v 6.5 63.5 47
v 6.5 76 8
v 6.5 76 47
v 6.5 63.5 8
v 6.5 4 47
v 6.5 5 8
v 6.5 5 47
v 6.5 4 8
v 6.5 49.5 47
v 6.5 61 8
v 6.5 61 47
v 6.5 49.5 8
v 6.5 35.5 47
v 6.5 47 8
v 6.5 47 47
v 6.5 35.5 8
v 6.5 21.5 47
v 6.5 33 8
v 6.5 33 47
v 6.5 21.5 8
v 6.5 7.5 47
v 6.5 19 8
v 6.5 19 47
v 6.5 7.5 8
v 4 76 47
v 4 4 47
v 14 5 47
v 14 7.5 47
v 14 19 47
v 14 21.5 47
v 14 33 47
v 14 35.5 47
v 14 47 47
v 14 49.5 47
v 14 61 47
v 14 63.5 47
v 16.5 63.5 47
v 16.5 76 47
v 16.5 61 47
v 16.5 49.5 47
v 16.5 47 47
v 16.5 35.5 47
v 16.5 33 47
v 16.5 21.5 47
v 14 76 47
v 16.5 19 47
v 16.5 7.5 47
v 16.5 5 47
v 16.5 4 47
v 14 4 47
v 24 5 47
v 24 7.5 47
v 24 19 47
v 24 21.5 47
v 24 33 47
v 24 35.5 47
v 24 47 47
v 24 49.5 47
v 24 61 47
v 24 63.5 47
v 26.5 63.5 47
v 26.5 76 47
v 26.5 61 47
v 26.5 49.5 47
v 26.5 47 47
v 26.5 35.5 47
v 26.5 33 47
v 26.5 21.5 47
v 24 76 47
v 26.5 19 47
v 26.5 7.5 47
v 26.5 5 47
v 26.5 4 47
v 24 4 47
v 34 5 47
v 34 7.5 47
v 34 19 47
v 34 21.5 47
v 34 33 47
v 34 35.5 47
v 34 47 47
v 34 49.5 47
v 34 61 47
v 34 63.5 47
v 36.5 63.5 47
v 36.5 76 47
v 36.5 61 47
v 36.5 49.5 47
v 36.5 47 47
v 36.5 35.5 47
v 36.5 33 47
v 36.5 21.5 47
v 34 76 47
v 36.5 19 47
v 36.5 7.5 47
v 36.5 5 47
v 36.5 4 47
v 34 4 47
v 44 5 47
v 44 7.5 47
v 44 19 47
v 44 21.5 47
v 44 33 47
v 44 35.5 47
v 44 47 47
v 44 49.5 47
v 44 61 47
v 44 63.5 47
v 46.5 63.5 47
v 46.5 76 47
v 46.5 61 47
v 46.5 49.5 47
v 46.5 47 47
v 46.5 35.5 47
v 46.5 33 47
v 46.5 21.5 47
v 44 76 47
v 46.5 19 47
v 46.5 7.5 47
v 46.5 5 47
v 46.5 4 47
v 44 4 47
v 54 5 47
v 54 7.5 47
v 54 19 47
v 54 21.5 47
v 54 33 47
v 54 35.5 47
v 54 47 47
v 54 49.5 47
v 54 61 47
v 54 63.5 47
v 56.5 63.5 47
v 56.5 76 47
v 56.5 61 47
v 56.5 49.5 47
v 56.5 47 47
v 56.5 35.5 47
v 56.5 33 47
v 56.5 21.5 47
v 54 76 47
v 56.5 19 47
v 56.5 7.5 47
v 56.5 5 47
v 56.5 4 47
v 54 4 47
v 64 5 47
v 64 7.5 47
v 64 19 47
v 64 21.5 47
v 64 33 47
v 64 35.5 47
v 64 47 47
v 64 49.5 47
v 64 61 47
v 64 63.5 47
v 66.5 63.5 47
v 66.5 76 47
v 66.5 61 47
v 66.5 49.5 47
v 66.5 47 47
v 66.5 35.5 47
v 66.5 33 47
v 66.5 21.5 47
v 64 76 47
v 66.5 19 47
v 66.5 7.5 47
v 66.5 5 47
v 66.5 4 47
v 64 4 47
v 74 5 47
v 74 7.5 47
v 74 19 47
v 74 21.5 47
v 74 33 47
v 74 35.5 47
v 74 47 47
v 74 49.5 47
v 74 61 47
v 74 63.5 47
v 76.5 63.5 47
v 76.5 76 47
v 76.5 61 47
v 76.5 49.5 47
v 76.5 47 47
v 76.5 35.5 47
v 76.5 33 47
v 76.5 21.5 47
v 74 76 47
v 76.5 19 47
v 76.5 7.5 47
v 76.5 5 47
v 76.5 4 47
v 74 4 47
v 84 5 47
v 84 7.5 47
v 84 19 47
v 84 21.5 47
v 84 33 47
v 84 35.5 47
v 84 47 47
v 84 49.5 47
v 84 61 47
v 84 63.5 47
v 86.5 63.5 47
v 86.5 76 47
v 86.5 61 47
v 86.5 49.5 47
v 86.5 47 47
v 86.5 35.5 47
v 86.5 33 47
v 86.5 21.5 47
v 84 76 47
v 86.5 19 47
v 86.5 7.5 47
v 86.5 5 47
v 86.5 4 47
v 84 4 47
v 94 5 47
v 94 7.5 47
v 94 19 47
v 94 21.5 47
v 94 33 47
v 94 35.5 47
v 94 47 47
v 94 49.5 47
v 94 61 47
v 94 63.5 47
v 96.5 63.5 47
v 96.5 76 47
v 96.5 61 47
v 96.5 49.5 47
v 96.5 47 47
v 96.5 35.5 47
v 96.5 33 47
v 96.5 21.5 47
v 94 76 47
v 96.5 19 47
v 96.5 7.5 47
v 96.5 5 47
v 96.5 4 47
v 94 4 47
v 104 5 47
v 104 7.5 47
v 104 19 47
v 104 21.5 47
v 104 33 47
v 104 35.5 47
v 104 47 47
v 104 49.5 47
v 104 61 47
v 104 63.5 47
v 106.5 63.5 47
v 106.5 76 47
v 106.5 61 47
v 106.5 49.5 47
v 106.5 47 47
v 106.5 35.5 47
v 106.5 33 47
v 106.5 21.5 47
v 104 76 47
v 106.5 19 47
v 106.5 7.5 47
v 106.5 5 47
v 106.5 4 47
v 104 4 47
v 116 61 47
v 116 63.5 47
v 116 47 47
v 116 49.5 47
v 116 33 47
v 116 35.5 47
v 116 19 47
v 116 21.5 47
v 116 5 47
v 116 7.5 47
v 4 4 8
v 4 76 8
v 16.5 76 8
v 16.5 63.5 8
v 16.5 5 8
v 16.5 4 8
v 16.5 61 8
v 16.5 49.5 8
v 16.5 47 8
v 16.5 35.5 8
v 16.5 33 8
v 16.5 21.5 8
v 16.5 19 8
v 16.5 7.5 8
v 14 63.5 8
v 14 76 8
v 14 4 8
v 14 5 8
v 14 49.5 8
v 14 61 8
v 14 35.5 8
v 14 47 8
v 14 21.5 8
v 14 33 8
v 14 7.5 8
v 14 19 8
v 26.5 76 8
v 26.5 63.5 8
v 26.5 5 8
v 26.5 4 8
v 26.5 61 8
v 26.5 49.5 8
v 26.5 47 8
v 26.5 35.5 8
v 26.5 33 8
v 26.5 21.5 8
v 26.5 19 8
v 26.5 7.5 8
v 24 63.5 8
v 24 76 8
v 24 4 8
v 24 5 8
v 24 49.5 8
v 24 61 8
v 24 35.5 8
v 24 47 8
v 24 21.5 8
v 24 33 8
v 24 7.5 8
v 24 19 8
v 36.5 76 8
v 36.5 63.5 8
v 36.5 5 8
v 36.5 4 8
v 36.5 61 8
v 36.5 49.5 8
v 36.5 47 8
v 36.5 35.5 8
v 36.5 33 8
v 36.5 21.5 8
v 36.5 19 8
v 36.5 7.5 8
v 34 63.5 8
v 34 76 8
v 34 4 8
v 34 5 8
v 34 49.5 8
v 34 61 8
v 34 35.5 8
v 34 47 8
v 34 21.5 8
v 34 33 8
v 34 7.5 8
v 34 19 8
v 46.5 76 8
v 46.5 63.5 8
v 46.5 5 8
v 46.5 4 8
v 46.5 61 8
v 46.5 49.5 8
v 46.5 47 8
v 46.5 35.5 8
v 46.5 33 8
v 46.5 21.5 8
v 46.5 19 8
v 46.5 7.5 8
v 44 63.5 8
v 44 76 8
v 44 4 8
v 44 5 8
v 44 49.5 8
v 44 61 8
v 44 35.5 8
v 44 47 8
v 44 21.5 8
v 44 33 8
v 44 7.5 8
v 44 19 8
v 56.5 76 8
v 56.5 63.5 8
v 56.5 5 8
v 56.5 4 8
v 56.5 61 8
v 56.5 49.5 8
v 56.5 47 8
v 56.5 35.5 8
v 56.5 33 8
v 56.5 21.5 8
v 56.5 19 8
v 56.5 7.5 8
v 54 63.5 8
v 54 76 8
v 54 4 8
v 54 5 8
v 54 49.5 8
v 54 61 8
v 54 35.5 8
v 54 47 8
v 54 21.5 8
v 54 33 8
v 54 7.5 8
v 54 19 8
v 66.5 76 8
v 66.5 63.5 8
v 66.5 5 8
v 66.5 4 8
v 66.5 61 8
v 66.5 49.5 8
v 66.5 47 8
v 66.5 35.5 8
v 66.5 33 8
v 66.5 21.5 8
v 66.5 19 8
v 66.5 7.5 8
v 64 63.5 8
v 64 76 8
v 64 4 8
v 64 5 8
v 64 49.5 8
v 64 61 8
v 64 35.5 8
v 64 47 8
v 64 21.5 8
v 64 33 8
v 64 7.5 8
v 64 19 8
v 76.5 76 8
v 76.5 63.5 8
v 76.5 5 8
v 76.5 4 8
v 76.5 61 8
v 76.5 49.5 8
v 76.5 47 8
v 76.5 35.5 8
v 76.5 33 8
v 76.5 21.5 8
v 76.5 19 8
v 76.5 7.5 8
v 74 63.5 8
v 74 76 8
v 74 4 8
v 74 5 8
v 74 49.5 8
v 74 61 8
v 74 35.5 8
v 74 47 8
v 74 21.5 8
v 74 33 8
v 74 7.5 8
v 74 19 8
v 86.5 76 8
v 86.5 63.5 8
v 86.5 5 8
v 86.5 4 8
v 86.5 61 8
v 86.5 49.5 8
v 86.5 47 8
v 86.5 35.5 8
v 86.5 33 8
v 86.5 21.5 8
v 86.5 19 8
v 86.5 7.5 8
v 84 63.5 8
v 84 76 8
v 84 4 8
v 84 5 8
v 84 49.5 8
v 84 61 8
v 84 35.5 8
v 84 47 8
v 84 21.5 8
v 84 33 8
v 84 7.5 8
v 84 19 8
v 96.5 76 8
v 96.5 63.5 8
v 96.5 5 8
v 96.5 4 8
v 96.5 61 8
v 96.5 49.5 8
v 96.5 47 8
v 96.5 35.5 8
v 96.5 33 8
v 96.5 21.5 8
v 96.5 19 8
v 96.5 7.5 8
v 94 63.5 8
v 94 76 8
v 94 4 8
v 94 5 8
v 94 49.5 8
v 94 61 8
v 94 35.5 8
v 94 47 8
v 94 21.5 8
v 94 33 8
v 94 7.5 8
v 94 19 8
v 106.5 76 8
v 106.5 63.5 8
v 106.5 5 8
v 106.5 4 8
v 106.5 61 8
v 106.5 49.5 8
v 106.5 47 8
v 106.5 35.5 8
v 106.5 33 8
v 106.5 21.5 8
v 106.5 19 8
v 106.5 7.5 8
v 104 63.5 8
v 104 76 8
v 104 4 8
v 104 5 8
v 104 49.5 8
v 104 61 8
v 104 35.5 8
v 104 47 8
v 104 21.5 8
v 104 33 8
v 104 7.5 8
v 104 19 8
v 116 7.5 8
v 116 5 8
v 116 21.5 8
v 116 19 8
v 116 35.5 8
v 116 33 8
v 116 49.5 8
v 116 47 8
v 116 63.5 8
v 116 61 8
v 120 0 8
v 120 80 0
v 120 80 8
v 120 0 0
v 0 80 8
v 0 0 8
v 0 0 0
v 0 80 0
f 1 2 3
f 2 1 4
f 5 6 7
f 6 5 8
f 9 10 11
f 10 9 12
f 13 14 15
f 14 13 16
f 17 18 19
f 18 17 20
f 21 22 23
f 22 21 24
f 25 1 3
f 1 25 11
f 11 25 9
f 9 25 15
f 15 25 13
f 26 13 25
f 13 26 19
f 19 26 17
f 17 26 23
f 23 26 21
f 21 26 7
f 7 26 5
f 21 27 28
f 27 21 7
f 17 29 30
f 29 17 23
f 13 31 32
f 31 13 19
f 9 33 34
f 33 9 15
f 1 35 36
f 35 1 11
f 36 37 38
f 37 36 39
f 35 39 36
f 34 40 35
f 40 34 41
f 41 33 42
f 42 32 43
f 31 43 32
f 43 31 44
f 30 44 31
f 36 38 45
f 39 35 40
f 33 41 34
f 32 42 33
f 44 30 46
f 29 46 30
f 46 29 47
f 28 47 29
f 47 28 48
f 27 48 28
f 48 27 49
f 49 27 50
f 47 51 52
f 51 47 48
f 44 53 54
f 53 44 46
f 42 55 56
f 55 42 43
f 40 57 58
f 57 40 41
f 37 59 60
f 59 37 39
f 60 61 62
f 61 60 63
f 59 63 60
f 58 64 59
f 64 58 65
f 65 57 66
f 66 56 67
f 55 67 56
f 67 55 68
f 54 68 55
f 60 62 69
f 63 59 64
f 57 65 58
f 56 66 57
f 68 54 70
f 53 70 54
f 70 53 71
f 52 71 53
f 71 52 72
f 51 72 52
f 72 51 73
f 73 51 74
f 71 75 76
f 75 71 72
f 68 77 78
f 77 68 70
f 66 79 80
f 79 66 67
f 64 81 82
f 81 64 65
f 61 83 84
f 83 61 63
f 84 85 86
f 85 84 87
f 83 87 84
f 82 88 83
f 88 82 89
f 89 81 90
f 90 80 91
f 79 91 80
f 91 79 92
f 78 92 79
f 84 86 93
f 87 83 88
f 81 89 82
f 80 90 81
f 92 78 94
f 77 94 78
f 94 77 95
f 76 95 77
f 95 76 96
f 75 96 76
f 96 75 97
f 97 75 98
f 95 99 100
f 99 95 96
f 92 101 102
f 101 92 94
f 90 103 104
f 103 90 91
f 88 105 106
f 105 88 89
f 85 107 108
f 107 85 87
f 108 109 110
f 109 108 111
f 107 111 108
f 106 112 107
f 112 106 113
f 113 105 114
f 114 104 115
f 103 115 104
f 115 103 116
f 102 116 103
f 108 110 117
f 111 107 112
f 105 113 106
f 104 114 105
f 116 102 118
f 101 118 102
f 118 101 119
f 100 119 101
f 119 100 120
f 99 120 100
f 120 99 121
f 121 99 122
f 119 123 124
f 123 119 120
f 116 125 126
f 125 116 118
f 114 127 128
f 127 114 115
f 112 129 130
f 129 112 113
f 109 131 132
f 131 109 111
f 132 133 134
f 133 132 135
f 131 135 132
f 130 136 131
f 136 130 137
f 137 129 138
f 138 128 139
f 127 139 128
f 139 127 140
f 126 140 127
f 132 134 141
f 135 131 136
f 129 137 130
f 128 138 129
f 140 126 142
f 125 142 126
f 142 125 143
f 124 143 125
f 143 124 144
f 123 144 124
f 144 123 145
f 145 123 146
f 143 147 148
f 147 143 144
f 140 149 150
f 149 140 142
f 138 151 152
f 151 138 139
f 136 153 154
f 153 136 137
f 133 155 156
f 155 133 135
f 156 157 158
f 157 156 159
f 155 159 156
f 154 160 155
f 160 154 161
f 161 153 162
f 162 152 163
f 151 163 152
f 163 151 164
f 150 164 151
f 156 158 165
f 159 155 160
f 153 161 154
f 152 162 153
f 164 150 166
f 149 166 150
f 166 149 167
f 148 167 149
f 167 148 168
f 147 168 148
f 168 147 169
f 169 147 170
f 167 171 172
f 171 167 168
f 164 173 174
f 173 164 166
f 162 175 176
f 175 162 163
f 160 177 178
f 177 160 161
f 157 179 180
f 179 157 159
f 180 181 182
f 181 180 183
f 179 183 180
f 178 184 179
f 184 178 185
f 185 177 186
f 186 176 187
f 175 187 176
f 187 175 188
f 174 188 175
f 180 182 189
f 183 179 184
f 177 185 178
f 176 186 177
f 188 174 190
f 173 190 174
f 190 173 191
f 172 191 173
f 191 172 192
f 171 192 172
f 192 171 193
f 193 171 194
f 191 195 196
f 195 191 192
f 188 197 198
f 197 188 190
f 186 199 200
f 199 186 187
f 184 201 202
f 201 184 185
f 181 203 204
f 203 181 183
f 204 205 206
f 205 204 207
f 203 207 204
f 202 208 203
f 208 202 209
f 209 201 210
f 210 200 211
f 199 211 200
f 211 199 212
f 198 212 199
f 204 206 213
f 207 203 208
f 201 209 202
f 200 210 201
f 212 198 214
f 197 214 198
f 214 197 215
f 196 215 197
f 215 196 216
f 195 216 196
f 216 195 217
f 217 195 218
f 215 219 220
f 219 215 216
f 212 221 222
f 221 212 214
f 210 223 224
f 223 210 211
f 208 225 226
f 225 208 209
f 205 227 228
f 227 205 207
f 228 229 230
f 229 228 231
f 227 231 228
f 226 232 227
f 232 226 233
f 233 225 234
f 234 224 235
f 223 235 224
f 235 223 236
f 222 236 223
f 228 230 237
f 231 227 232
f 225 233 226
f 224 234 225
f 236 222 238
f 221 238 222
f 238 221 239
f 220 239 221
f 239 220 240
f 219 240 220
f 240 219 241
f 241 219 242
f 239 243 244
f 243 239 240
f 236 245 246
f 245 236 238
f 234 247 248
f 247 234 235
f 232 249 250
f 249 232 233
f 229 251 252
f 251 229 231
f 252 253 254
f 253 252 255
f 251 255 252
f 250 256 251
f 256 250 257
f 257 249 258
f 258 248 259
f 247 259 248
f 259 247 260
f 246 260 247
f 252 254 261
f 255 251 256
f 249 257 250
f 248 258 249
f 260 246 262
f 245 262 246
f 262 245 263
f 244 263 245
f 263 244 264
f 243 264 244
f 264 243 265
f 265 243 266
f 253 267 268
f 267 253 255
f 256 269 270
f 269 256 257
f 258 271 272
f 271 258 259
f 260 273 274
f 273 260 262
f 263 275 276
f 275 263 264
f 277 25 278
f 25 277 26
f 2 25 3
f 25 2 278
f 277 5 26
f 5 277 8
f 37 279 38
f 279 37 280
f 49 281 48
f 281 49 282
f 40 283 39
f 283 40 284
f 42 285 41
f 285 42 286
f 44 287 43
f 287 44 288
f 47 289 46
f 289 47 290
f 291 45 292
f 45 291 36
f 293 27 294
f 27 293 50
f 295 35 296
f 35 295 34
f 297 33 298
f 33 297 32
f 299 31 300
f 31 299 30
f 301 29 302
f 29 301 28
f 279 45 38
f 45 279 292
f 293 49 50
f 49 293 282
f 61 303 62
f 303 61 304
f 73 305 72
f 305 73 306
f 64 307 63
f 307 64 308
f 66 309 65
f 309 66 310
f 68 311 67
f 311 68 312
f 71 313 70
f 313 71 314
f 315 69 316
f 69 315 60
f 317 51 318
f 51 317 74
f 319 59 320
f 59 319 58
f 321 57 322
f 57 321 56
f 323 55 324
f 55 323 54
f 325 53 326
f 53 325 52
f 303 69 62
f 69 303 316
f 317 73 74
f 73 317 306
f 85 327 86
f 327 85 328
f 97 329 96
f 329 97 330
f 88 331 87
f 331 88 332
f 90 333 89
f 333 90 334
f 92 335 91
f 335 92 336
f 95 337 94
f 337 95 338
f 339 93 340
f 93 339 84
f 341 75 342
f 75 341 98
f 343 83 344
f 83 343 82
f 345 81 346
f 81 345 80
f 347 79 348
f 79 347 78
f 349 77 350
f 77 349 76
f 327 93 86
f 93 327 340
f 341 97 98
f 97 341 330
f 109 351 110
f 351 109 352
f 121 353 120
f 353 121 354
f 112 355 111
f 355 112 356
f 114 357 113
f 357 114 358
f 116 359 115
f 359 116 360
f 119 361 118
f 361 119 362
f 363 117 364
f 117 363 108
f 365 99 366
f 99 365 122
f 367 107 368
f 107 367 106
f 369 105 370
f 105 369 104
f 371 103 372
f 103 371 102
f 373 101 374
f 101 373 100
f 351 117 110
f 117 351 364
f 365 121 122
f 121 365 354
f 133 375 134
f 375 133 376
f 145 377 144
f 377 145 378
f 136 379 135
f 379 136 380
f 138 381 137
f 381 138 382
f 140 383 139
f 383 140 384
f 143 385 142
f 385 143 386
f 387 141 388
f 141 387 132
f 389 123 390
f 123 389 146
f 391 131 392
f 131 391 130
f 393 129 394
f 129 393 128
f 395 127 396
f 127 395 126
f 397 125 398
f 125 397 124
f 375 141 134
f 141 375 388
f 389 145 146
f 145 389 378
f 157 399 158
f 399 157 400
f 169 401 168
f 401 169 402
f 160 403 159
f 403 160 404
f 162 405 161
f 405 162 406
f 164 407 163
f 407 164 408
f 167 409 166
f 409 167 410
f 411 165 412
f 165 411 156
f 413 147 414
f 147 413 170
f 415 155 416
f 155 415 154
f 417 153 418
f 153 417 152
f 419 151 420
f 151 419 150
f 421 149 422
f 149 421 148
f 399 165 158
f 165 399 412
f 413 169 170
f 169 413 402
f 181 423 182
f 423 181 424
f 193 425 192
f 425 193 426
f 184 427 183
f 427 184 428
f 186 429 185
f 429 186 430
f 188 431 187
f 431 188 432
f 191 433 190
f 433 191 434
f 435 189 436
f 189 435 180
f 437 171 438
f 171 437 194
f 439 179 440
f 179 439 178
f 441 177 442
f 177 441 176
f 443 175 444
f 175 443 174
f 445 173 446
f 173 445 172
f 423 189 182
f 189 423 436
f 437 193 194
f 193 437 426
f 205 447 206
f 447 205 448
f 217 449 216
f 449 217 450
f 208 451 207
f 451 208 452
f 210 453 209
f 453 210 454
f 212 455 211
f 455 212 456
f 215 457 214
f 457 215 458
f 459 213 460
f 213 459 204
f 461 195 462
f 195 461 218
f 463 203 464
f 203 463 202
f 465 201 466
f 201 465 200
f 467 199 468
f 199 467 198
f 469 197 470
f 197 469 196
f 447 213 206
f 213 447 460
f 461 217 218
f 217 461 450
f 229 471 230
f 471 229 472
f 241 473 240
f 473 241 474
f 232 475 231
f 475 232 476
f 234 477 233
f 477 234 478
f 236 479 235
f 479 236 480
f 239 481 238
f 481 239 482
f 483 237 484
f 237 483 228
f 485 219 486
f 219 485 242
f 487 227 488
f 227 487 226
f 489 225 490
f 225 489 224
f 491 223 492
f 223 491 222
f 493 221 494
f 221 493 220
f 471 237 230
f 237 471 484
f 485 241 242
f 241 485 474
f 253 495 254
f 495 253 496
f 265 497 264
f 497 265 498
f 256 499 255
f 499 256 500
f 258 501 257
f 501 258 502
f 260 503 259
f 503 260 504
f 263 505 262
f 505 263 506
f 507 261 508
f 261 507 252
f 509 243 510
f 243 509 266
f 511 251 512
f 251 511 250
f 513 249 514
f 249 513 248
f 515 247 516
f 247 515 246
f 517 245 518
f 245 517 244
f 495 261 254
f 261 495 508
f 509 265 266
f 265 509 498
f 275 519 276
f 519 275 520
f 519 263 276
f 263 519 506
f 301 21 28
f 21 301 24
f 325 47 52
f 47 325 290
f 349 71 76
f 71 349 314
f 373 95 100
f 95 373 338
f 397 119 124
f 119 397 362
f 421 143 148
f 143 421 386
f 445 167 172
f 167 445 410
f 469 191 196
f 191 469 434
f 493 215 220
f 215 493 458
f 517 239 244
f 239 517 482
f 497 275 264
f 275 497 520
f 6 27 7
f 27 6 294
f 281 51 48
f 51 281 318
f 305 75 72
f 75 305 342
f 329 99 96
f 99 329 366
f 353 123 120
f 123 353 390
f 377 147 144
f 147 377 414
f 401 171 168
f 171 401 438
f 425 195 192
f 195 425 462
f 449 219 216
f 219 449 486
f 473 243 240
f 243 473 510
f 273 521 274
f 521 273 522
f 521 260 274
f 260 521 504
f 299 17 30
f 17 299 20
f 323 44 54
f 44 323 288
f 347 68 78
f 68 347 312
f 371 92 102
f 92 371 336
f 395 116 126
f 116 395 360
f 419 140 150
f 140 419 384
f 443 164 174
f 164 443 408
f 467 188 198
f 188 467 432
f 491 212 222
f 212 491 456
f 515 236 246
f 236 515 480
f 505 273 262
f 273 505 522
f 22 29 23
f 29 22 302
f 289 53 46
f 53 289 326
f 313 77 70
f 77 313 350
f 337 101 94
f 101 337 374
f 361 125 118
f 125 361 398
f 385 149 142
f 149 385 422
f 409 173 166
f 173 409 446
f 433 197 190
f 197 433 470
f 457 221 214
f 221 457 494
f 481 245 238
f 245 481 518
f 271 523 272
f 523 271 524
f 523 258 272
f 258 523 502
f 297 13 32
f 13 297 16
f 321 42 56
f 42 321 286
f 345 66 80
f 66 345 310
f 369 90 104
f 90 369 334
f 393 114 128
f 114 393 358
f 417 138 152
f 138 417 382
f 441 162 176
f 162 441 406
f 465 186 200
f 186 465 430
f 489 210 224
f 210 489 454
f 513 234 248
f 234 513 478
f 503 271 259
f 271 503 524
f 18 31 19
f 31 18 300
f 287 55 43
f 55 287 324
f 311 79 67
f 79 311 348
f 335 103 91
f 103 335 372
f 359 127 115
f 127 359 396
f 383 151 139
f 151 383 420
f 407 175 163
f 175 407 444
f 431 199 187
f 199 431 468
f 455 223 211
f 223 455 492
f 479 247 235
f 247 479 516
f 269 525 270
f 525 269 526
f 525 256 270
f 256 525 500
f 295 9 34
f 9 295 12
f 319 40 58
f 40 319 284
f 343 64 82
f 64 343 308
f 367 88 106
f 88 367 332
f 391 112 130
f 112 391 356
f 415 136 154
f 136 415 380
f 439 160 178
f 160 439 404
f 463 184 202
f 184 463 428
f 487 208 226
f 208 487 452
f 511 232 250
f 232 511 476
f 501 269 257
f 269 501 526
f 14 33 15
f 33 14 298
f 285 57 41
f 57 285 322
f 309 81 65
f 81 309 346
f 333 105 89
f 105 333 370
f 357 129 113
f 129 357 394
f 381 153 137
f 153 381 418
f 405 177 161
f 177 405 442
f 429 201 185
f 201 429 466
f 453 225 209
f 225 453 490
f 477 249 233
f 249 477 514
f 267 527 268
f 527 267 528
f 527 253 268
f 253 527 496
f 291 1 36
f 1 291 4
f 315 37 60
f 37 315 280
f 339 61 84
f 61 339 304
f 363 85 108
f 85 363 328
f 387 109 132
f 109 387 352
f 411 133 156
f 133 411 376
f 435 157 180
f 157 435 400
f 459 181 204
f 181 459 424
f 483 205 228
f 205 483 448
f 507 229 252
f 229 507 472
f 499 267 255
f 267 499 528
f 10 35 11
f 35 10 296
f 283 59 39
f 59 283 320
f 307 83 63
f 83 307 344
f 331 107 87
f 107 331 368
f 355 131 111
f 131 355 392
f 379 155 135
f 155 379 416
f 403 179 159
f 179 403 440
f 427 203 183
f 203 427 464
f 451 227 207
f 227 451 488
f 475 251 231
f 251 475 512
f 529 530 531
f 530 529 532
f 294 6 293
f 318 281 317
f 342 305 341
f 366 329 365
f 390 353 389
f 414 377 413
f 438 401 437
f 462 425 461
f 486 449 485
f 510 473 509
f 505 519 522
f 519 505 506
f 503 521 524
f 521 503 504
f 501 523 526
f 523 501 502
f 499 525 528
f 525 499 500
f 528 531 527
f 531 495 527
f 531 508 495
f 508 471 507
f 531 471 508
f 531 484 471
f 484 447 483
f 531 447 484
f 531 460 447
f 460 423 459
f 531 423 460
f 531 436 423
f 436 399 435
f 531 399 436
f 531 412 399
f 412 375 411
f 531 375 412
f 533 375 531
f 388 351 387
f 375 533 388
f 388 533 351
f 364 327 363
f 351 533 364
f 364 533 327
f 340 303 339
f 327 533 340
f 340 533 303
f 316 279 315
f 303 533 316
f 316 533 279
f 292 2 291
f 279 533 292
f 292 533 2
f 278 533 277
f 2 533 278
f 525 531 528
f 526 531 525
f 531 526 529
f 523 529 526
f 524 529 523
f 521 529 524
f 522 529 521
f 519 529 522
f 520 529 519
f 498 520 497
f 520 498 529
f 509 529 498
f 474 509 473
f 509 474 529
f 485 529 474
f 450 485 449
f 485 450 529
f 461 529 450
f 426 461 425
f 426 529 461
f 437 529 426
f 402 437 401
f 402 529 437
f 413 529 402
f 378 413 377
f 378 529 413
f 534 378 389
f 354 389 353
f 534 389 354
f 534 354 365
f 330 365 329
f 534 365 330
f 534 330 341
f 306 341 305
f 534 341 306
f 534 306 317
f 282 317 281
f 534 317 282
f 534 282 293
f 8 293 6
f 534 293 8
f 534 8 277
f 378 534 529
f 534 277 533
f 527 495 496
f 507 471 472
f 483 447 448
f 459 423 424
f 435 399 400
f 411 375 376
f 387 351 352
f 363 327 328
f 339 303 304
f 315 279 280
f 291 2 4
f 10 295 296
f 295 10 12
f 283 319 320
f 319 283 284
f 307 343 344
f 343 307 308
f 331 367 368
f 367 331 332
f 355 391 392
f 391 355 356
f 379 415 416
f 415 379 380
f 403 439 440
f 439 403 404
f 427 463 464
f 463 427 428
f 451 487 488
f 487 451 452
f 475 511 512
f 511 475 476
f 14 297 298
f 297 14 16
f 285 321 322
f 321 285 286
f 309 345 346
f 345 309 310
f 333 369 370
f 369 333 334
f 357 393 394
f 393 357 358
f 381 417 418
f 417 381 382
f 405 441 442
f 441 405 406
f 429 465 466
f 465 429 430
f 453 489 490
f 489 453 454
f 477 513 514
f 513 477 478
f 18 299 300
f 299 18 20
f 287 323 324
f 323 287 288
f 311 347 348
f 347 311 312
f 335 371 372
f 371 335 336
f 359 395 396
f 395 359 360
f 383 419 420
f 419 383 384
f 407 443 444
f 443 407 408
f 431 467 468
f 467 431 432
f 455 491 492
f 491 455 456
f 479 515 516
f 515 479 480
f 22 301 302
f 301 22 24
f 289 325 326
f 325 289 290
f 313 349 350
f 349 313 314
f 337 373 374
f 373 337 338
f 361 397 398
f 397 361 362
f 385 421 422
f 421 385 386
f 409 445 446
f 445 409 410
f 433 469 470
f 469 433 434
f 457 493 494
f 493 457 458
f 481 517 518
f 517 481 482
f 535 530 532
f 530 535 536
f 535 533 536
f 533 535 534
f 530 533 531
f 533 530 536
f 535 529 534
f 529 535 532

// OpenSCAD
$fn = 32;

// ----------------------------------------------------------------------
// Heatsink: cross fin block
// ----------------------------------------------------------------------

// --- parameters (mm) ---
base_l = 120;             // base length, X
base_w = 80;              // base width, Y
base_t = 8;               // base plate thickness
fin_h = 40;               // fin height above the base
fin_t = 2.5;              // fin thickness
edge = 4;                 // margin from the base ends
pitch = 10;               // fin pitch
rib_pitch = 14;           // cross rib pitch

n_fins = floor((base_l - 2 * edge - fin_t) / pitch) + 1;  // fin count
total_h = base_t + fin_h - 1;  // overall height
n_ribs = floor((base_w - 2 * edge) / rib_pitch);  // rib count

union() {
  cube([base_l, base_w, base_t]);
  for (i = [0 : n_fins - 1])
    translate([edge + i * pitch, edge, base_t - 1])
      cube([fin_t, base_w - 2 * edge, fin_h]);
  for (i = [0 : n_ribs - 1])
    translate([edge, edge + 1 + i * rib_pitch, base_t - 1])
      cube([base_l - 2 * edge, fin_t, fin_h]);
}
